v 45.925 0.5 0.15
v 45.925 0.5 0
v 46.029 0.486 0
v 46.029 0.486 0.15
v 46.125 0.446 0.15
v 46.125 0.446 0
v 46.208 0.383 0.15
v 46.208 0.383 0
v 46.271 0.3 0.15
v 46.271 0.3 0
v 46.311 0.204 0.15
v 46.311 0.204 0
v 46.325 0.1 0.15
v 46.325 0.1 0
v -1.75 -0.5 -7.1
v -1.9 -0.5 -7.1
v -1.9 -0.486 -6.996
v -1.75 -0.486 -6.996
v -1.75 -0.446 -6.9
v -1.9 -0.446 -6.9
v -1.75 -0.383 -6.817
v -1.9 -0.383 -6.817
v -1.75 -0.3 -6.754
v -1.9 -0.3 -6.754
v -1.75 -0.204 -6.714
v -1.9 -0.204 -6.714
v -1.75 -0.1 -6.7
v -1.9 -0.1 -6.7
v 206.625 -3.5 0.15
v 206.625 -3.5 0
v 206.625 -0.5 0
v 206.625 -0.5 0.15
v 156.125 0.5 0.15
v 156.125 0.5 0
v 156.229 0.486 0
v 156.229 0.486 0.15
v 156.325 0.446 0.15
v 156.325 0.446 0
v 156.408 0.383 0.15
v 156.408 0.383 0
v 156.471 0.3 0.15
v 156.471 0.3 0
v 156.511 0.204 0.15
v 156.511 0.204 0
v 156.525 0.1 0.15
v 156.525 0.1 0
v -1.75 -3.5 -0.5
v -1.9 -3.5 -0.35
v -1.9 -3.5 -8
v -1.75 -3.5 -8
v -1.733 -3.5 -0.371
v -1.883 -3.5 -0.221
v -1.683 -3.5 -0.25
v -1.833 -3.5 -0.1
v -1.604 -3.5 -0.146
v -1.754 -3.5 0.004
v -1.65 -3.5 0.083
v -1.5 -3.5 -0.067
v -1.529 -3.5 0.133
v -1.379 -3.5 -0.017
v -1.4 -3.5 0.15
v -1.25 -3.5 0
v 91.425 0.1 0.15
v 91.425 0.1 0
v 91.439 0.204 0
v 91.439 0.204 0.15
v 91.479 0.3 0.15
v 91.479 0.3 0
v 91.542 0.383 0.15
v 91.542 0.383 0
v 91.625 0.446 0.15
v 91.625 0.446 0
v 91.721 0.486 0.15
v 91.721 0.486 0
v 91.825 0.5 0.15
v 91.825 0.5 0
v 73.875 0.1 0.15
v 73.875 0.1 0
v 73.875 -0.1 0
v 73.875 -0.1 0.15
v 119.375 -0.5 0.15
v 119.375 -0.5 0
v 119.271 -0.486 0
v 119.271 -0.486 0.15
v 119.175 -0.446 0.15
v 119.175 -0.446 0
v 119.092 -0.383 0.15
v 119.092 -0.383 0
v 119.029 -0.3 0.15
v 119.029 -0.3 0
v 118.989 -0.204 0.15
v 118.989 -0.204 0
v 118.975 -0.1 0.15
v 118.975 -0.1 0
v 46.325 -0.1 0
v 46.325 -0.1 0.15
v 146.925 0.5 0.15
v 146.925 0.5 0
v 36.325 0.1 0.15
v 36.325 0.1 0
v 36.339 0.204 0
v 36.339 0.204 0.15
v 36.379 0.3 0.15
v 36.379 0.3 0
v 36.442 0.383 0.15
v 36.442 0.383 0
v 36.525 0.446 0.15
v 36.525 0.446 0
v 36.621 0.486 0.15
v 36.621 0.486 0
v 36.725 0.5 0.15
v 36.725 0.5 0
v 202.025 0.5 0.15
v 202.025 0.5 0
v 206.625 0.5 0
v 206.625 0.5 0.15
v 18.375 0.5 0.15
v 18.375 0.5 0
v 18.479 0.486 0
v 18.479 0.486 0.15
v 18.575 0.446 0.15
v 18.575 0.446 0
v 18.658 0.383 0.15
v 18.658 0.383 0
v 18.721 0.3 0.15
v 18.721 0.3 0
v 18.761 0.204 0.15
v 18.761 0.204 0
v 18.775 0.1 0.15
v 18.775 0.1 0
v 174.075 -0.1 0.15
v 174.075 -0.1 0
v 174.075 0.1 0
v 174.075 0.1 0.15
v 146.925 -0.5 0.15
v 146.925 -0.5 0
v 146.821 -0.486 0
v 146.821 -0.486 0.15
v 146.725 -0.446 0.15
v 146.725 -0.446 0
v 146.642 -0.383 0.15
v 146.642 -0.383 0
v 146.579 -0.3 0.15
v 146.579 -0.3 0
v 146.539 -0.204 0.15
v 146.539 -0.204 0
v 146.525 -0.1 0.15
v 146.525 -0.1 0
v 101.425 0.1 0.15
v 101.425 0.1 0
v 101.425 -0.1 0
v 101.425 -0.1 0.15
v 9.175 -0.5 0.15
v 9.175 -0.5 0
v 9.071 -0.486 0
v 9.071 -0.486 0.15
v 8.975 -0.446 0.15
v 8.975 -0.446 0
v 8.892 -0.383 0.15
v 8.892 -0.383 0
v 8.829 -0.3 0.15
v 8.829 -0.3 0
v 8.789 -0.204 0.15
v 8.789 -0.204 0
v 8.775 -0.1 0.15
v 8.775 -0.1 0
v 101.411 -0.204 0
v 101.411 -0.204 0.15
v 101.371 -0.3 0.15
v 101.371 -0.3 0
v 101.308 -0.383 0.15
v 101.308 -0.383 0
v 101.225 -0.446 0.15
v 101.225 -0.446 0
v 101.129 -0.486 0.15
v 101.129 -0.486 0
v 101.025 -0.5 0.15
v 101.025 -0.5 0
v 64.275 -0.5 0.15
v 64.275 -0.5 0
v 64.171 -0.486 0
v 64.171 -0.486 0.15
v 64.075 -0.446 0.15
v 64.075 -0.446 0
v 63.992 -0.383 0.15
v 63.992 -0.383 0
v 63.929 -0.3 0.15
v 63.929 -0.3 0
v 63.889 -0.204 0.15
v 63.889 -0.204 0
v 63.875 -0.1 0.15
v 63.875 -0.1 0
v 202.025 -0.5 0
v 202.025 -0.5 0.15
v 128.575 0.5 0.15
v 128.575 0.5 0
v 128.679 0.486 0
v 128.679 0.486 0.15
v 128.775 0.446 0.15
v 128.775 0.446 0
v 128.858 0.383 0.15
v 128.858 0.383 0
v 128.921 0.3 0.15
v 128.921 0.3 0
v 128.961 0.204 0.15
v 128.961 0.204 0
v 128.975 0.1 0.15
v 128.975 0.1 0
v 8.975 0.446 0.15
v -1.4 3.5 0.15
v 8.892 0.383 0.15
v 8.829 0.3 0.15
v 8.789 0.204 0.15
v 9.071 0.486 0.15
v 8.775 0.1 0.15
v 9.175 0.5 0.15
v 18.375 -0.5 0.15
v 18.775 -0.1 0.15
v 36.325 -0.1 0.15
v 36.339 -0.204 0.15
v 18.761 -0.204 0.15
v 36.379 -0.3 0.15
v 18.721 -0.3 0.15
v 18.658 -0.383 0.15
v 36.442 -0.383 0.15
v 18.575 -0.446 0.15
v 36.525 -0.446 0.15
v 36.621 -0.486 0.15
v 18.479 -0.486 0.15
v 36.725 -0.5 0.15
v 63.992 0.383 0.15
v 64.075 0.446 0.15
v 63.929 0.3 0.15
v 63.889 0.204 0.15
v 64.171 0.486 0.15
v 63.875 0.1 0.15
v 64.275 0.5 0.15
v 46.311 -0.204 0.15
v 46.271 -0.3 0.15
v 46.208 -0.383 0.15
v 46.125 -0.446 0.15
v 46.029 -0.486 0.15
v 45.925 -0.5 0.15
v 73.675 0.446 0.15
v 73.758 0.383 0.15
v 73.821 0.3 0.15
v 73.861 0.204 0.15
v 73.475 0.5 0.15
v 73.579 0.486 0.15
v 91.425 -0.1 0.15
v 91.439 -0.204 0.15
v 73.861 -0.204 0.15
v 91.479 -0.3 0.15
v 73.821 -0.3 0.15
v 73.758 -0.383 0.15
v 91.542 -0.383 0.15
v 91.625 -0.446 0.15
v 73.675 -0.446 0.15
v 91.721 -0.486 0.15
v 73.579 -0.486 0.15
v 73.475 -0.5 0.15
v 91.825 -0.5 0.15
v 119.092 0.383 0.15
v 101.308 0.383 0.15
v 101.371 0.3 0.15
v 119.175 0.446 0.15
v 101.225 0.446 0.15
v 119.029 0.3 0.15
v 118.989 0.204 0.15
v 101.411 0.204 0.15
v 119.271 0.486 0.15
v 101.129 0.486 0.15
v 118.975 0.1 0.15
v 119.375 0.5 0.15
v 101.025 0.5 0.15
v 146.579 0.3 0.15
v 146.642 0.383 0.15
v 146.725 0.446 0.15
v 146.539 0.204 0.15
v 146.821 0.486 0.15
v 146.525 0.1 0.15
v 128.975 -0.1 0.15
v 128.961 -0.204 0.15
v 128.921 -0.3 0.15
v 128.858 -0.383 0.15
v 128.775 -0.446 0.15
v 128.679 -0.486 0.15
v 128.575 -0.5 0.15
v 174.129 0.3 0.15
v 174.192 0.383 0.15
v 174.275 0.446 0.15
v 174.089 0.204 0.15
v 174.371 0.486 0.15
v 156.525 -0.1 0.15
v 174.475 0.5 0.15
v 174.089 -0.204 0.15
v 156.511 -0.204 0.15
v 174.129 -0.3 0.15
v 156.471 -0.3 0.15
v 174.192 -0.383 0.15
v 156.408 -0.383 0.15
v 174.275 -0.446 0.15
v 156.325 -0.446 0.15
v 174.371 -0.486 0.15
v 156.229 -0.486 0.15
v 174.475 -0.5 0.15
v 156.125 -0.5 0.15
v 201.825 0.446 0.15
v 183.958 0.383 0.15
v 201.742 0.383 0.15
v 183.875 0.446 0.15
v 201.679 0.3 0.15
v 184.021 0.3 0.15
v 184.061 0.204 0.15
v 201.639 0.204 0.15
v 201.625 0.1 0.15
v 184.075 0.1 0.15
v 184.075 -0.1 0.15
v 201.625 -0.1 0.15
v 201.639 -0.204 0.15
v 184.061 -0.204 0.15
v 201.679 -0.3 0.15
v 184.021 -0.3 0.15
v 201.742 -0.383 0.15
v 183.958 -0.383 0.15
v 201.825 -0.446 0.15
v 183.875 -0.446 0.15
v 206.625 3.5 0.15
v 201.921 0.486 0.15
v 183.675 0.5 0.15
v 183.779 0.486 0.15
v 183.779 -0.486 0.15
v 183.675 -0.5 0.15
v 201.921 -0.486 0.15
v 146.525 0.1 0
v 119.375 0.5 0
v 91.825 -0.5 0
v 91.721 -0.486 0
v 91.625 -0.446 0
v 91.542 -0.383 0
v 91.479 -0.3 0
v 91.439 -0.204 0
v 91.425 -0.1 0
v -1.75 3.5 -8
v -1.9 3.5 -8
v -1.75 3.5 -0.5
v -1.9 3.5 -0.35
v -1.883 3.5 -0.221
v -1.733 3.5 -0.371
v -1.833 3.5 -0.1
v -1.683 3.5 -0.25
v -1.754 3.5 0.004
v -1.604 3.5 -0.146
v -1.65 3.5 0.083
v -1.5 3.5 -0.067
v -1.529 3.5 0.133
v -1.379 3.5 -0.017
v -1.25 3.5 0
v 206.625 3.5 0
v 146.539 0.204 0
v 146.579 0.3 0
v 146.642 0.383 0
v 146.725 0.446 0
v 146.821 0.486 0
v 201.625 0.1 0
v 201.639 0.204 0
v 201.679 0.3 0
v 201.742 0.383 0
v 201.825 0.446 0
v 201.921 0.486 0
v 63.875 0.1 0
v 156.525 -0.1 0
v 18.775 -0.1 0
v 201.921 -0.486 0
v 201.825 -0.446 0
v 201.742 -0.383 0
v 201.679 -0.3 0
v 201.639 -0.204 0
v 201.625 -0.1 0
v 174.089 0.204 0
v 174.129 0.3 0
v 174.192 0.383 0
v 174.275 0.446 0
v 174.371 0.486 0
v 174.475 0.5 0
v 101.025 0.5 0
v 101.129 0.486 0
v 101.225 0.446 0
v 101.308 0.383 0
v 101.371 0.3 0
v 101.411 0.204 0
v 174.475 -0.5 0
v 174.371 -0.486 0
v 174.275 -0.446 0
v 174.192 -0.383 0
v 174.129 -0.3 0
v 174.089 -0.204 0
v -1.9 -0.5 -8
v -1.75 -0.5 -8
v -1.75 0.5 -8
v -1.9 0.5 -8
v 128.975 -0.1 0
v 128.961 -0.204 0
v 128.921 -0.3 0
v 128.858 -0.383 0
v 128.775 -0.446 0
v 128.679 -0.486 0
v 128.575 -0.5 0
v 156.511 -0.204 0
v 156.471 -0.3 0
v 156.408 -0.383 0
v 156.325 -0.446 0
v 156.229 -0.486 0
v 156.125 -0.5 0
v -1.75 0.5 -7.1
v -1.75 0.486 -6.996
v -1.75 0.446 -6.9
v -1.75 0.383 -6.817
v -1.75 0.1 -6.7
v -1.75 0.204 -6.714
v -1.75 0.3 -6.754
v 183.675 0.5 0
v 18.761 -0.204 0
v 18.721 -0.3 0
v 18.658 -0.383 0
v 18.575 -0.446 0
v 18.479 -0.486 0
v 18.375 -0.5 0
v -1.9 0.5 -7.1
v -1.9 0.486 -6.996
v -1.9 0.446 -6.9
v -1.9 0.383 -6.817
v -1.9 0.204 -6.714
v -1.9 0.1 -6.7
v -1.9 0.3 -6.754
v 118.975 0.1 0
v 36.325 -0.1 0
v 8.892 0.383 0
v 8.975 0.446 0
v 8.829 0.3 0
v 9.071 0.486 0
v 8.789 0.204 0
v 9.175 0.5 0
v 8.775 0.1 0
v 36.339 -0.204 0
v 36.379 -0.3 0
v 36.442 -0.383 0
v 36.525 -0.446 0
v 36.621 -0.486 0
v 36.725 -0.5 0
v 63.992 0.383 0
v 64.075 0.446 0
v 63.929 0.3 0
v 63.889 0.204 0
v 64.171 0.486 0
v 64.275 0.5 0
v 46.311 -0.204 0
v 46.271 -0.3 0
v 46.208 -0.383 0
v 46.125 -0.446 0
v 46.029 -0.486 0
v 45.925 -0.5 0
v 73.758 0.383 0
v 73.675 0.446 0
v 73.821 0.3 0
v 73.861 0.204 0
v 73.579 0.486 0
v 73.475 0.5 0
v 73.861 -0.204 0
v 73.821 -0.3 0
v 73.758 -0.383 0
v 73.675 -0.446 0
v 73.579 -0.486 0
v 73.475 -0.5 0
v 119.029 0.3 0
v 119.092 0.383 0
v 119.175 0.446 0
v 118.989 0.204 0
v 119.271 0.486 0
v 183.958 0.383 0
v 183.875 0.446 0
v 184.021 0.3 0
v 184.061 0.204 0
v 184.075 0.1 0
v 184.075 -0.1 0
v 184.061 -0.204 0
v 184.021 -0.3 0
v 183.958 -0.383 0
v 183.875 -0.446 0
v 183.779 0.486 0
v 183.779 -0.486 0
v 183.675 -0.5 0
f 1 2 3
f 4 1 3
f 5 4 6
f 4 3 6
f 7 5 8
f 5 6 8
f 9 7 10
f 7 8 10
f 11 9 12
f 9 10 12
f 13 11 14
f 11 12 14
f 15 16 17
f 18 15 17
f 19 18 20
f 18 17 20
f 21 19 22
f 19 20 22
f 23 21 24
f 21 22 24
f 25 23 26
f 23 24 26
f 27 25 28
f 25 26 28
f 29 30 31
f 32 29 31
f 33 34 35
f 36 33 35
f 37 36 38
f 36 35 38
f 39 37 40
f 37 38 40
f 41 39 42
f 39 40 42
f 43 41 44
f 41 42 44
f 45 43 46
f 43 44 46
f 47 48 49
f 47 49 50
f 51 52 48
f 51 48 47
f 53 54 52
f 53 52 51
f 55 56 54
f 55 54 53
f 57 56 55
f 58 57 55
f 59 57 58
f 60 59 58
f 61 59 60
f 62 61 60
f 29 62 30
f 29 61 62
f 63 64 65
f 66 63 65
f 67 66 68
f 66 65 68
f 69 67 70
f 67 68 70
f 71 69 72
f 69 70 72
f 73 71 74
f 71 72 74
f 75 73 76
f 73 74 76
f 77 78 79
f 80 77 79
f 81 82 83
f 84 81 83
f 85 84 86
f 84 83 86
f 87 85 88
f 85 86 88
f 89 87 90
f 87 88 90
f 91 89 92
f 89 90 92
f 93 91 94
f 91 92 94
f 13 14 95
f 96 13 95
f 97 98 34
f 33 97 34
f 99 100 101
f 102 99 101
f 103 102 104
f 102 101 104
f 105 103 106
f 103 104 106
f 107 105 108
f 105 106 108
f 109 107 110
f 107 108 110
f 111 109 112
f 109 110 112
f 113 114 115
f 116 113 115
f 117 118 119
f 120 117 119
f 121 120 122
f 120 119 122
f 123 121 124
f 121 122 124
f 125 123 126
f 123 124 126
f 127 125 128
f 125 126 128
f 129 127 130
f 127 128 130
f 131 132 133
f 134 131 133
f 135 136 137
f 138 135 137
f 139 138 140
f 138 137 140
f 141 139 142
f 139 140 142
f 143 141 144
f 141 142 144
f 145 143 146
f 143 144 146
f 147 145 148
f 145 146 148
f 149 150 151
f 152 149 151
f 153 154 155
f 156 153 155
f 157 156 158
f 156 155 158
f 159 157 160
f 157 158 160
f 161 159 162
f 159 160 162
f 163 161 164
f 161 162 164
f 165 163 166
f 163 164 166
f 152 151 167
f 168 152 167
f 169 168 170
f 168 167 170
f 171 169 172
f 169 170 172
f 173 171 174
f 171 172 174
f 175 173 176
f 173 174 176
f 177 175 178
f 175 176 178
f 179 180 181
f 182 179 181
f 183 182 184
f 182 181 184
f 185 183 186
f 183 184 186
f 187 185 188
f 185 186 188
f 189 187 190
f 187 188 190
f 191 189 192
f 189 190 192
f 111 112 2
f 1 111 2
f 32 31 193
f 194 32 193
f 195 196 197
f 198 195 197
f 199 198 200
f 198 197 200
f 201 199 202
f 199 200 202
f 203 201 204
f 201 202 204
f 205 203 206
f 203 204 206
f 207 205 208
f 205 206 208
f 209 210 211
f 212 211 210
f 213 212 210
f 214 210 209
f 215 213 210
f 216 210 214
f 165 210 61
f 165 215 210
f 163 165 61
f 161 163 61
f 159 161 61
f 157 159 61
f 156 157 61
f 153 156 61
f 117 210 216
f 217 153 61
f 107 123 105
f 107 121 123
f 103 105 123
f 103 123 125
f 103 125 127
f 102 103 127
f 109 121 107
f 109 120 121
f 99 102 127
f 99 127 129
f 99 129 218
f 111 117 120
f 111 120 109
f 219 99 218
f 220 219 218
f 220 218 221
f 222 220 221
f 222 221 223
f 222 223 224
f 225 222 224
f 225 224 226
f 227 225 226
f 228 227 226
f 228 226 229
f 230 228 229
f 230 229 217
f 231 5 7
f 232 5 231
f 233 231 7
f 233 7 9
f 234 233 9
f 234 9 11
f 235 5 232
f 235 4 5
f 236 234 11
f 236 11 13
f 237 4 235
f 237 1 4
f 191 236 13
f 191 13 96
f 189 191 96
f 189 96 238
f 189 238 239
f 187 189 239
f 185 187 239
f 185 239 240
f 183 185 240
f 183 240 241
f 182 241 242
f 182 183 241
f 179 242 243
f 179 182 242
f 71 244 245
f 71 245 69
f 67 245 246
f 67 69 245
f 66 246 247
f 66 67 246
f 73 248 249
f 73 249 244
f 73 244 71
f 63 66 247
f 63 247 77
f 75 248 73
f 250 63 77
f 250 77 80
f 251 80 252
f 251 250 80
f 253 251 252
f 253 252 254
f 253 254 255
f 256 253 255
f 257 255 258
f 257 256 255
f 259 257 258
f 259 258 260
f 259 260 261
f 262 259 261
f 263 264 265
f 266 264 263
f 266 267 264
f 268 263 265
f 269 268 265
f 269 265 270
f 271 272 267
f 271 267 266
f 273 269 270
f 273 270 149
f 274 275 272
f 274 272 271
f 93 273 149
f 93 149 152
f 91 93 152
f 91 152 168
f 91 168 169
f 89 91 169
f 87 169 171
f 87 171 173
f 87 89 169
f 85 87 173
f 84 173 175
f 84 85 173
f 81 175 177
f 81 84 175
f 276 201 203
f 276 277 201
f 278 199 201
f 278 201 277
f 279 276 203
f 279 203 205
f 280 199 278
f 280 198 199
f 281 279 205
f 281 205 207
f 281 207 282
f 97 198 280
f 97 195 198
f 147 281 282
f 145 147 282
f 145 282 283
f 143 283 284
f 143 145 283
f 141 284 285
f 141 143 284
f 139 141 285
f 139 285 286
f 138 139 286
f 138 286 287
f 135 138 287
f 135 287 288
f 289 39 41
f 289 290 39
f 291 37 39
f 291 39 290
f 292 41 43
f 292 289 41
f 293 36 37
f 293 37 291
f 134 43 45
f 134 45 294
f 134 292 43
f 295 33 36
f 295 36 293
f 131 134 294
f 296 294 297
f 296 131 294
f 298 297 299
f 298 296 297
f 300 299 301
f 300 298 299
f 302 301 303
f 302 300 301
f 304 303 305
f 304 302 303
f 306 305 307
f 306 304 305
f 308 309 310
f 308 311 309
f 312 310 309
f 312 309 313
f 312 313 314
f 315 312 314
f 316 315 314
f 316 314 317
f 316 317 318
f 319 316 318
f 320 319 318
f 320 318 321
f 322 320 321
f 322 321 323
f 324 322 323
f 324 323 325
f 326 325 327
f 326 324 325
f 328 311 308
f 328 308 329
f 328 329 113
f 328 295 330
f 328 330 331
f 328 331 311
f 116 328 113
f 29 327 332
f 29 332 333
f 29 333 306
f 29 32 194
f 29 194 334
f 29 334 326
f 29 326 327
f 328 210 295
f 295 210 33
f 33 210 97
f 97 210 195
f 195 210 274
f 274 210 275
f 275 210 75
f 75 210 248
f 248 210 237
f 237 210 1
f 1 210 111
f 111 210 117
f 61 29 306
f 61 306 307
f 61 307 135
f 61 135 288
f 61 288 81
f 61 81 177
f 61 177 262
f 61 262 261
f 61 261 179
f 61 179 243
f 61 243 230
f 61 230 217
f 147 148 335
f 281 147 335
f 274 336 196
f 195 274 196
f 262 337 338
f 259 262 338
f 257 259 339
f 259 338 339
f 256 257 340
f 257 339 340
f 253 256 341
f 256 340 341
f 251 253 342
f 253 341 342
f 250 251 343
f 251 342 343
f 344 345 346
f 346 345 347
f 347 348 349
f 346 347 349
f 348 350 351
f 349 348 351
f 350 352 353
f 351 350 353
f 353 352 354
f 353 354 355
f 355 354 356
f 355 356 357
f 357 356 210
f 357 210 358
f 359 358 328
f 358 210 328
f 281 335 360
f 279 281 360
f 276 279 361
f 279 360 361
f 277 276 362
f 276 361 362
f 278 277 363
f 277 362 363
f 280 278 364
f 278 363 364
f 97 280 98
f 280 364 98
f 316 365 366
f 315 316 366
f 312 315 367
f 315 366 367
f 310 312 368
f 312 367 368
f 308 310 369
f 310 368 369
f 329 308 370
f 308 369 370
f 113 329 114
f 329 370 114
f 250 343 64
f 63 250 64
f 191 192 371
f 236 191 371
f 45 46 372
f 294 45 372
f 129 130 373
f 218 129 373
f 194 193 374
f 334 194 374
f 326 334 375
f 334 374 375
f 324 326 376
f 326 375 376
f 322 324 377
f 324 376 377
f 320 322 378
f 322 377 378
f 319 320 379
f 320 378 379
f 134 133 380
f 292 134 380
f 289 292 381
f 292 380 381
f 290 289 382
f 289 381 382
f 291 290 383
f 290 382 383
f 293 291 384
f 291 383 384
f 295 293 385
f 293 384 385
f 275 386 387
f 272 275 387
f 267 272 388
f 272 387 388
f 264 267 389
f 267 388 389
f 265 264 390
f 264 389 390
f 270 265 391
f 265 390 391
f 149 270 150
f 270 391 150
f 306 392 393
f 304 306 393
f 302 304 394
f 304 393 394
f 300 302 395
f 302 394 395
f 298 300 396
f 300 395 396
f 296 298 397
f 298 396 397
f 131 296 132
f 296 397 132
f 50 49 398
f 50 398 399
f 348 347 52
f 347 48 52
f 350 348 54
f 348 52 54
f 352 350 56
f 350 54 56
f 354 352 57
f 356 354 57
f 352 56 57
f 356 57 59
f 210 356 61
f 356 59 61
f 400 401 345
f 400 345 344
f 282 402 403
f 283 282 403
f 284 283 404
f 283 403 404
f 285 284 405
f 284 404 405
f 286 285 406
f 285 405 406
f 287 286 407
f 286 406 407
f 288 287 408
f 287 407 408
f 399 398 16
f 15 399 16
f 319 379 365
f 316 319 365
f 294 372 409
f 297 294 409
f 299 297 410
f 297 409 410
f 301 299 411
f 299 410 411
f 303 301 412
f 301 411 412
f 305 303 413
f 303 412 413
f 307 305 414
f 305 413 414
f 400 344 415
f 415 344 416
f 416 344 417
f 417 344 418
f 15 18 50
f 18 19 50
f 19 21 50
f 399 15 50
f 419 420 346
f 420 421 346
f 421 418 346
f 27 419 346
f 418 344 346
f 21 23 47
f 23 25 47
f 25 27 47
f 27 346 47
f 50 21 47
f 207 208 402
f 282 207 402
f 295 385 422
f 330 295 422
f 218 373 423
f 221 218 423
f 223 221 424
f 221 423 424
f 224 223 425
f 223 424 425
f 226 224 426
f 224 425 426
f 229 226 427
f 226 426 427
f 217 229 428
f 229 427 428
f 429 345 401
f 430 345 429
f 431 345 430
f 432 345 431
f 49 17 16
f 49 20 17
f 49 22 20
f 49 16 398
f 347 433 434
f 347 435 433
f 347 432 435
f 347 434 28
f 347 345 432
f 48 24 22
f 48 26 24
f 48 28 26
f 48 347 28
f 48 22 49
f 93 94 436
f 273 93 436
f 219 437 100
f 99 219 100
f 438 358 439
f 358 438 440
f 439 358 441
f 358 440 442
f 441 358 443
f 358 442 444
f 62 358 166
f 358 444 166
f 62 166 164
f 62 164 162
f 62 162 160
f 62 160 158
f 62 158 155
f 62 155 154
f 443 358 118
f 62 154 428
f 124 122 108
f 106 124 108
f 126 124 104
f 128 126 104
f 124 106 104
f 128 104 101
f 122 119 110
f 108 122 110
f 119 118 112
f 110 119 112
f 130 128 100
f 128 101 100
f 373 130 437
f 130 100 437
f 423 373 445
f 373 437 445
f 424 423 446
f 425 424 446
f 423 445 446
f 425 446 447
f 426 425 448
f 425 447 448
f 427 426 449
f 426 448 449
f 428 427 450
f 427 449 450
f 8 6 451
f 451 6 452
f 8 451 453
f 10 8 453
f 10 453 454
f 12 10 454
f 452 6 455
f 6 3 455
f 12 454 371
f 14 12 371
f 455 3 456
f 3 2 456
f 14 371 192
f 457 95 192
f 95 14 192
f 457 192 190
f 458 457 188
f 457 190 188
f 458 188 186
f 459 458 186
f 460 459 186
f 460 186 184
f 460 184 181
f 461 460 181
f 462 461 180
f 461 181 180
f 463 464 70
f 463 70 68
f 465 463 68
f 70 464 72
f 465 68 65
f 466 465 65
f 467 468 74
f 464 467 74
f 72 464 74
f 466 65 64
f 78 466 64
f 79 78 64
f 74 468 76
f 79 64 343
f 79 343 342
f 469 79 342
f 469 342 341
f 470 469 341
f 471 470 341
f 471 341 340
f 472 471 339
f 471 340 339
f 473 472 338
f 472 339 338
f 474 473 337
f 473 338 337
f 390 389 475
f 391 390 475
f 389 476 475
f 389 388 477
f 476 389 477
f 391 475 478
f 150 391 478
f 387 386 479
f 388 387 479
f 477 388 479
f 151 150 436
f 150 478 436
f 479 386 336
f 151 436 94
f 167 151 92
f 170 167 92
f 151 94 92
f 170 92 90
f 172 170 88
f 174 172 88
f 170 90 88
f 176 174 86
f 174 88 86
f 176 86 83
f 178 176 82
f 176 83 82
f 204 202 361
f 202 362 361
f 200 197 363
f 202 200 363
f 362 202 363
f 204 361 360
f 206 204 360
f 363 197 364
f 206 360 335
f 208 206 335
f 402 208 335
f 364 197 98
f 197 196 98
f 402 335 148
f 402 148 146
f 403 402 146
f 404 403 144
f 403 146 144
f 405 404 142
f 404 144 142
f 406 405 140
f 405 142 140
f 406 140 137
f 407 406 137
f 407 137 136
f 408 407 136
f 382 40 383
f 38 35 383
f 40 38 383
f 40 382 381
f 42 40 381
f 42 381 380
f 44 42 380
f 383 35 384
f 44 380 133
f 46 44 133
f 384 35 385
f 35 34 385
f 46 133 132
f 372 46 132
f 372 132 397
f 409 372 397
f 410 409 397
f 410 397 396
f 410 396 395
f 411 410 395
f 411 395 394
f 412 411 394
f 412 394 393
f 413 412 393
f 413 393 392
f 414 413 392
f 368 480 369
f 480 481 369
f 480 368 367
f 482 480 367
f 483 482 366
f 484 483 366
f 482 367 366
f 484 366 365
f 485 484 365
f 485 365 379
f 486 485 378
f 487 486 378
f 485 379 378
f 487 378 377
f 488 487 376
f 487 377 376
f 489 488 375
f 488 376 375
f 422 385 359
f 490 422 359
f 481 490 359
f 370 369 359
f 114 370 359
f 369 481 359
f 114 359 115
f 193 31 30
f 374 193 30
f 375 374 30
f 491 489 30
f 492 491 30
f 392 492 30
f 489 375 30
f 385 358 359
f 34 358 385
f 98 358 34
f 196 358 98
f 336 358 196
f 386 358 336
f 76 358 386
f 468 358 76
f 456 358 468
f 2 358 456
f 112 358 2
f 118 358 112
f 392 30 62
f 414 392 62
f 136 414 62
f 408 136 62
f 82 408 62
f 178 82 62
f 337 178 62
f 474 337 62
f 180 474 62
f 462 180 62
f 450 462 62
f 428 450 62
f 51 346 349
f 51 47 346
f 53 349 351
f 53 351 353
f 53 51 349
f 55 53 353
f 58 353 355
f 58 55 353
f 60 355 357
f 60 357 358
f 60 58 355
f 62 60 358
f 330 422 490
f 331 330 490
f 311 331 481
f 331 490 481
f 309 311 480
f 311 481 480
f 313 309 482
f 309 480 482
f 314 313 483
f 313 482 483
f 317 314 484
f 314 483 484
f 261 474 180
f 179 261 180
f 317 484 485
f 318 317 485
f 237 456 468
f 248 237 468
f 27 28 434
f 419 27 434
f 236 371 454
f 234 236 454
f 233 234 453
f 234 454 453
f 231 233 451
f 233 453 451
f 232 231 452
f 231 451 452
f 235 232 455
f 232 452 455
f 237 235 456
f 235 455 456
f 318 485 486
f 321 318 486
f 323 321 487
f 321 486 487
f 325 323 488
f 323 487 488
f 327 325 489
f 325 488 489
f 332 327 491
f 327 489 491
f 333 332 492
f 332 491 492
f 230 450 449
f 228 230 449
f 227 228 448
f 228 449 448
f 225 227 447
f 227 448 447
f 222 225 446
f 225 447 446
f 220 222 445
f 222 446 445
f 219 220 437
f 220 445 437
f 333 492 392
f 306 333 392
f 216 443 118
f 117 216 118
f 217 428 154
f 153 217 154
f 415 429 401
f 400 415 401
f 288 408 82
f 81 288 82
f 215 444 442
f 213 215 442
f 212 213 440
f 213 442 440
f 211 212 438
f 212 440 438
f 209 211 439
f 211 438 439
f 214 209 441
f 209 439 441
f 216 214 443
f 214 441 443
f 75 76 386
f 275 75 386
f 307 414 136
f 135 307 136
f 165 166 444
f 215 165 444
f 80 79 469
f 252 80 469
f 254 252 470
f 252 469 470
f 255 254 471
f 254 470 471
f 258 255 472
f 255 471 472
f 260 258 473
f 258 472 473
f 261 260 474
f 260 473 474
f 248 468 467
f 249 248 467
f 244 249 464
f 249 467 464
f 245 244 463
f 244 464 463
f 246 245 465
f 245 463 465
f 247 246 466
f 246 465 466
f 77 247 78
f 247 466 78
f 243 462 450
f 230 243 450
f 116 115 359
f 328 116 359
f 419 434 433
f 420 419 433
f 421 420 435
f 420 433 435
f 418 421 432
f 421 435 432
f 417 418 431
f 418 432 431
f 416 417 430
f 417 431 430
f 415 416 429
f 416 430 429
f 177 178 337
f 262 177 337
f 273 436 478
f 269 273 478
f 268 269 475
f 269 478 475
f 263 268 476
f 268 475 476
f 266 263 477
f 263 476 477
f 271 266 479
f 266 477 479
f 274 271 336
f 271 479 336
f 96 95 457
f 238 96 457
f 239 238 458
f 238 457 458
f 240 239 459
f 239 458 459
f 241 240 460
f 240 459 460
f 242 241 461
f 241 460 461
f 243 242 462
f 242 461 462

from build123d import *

# Parameters (mm, degrees)
F1_DEPTH = 0.15
F2_DEPTH = 1.9
F3_W     = 0.15
F3_H     = 7
F4_DEPTH = 8
F6_DEPTH = 25
F7_R     = 0.5


with BuildPart() as f1:
    # F0 (on Top) → F1 (new body)
    with BuildSketch(Plane.XY):
        with BuildLine():
            Line((96.425, -0.5), (96.425, -3.5))
            Line((96.425, -3.5), (99.425, -3.5))
            Line((99.425, -3.5), (110.2, -3.5))
            Line((110.2, -3.5), (123.975, -3.5))
            Line((123.975, -3.5), (123.975, -0.5))
            Line((123.975, -0.5), (119.375, -0.5))
            ThreePointArc((119.375, -0.5), (119.0921572875, -0.3828427125), (118.975, -0.1))
            Line((118.975, -0.1), (118.975, 0.1))
            ThreePointArc((118.975, 0.1), (119.0921572875, 0.3828427125), (119.375, 0.5))
            Line((119.375, 0.5), (123.975, 0.5))
            Line((123.975, 0.5), (123.975, 3.5))
            Line((123.975, 3.5), (110.2, 3.5))
            Line((110.2, 3.5), (99.425, 3.5))
            Line((99.425, 3.5), (96.425, 3.5))
            Line((96.425, 3.5), (96.425, 0.5))
            Line((96.425, 0.5), (101.025, 0.5))
            ThreePointArc((101.025, 0.5), (101.3078427125, 0.3828427125), (101.425, 0.1))
            Line((101.425, 0.1), (101.425, -0.1))
            ThreePointArc((101.425, -0.1), (101.3078427125, -0.3828427125), (101.025, -0.5))
            Line((101.025, -0.5), (96.425, -0.5))
        make_face()
        with BuildLine():
            Line((13.775, -0.5), (13.775, -3.5))
            Line((13.775, -3.5), (27.55, -3.5))
            Line((27.55, -3.5), (41.325, -3.5))
            Line((41.325, -3.5), (41.325, -0.5))
            Line((41.325, -0.5), (36.725, -0.5))
            ThreePointArc((36.725, -0.5), (36.4421572875, -0.3828427125), (36.325, -0.1))
            Line((36.325, -0.1), (36.325, 0.1))
            ThreePointArc((36.325, 0.1), (36.4421572875, 0.3828427125), (36.725, 0.5))
            Line((36.725, 0.5), (41.325, 0.5))
            Line((41.325, 0.5), (41.325, 3.5))
            Line((41.325, 3.5), (27.55, 3.5))
            Line((27.55, 3.5), (13.775, 3.5))
            Line((13.775, 3.5), (13.775, 0.5))
            Line((13.775, 0.5), (18.375, 0.5))
            ThreePointArc((18.375, 0.5), (18.6578427125, 0.3828427125), (18.775, 0.1))
            Line((18.775, 0.1), (18.775, -0.1))
            ThreePointArc((18.775, -0.1), (18.6578427125, -0.3828427125), (18.375, -0.5))
            Line((18.375, -0.5), (13.775, -0.5))
        make_face()
        with BuildLine():
            Line((41.325, -0.5), (41.325, -3.5))
            Line((41.325, -3.5), (55.1, -3.5))
            Line((55.1, -3.5), (68.875, -3.5))
            Line((68.875, -3.5), (68.875, -0.5))
            Line((68.875, -0.5), (64.275, -0.5))
            ThreePointArc((64.275, -0.5), (63.9921572875, -0.3828427125), (63.875, -0.1))
            Line((63.875, -0.1), (63.875, 0.1))
            ThreePointArc((63.875, 0.1), (63.9921572875, 0.3828427125), (64.275, 0.5))
            Line((64.275, 0.5), (68.875, 0.5))
            Line((68.875, 0.5), (68.875, 3.5))
            Line((68.875, 3.5), (55.1, 3.5))
            Line((55.1, 3.5), (41.325, 3.5))
            Line((41.325, 3.5), (41.325, 0.5))
            Line((41.325, 0.5), (45.925, 0.5))
            ThreePointArc((45.925, 0.5), (46.2078427125, 0.3828427125), (46.325, 0.1))
            Line((46.325, 0.1), (46.325, -0.1))
            ThreePointArc((46.325, -0.1), (46.2078427125, -0.3828427125), (45.925, -0.5))
            Line((45.925, -0.5), (41.325, -0.5))
        make_face()
        with BuildLine():
            Line((68.875, -0.5), (68.875, -3.5))
            Line((68.875, -3.5), (82.65, -3.5))
            Line((82.65, -3.5), (96.425, -3.5))
            Line((96.425, -3.5), (96.425, -0.5))
            Line((96.425, -0.5), (91.825, -0.5))
            ThreePointArc((91.825, -0.5), (91.5421572875, -0.3828427125), (91.425, -0.1))
            Line((91.425, -0.1), (91.425, 0.1))
            ThreePointArc((91.425, 0.1), (91.5421572875, 0.3828427125), (91.825, 0.5))
            Line((91.825, 0.5), (96.425, 0.5))
            Line((96.425, 0.5), (96.425, 3.5))
            Line((96.425, 3.5), (82.65, 3.5))
            Line((82.65, 3.5), (68.875, 3.5))
            Line((68.875, 3.5), (68.875, 0.5))
            Line((68.875, 0.5), (73.475, 0.5))
            ThreePointArc((73.475, 0.5), (73.7578427125, 0.3828427125), (73.875, 0.1))
            Line((73.875, 0.1), (73.875, -0.1))
            ThreePointArc((73.875, -0.1), (73.7578427125, -0.3828427125), (73.475, -0.5))
            Line((73.475, -0.5), (68.875, -0.5))
        make_face()
        with BuildLine():
            Line((0, 3.5), (0, -3.5))
            Line((0, -3.5), (13.775, -3.5))
            Line((13.775, -3.5), (13.775, -0.5))
            Line((13.775, -0.5), (9.175, -0.5))
            ThreePointArc((9.175, -0.5), (8.8921572875, -0.3828427125), (8.775, -0.1))
            Line((8.775, -0.1), (8.775, 0.1))
            ThreePointArc((8.775, 0.1), (8.8921572875, 0.3828427125), (9.175, 0.5))
            Line((9.175, 0.5), (13.775, 0.5))
            Line((13.775, 0.5), (13.775, 3.5))
            Line((13.775, 3.5), (0, 3.5))
        make_face()
        with BuildLine():
            Line((123.975, -0.5), (123.975, -3.5))
            Line((123.975, -3.5), (137.75, -3.5))
            Line((137.75, -3.5), (151.525, -3.5))
            Line((151.525, -3.5), (151.525, -0.5))
            Line((151.525, -0.5), (146.925, -0.5))
            ThreePointArc((146.925, -0.5), (146.6421572875, -0.3828427125), (146.525, -0.1))
            Line((146.525, -0.1), (146.525, 0.1))
            ThreePointArc((146.525, 0.1), (146.6421572875, 0.3828427125), (146.925, 0.5))
            Line((146.925, 0.5), (151.525, 0.5))
            Line((151.525, 0.5), (151.525, 3.5))
            Line((151.525, 3.5), (137.75, 3.5))
            Line((137.75, 3.5), (123.975, 3.5))
            Line((123.975, 3.5), (123.975, 0.5))
            Line((123.975, 0.5), (128.575, 0.5))
            ThreePointArc((128.575, 0.5), (128.8578427125, 0.3828427125), (128.975, 0.1))
            Line((128.975, 0.1), (128.975, -0.1))
            ThreePointArc((128.975, -0.1), (128.8578427125, -0.3828427125), (128.575, -0.5))
            Line((128.575, -0.5), (123.975, -0.5))
        make_face()
        with BuildLine():
            Line((151.525, -0.5), (151.525, -3.5))
            Line((151.525, -3.5), (165.3, -3.5))
            Line((165.3, -3.5), (179.075, -3.5))
            Line((179.075, -3.5), (179.075, -0.5))
            Line((179.075, -0.5), (174.475, -0.5))
            ThreePointArc((174.475, -0.5), (174.1921572875, -0.3828427125), (174.075, -0.1))
            Line((174.075, -0.1), (174.075, 0.1))
            ThreePointArc((174.075, 0.1), (174.1921572875, 0.3828427125), (174.475, 0.5))
            Line((174.475, 0.5), (179.075, 0.5))
            Line((179.075, 0.5), (179.075, 3.5))
            Line((179.075, 3.5), (165.3, 3.5))
            Line((165.3, 3.5), (151.525, 3.5))
            Line((151.525, 3.5), (151.525, 0.5))
            Line((151.525, 0.5), (156.125, 0.5))
            ThreePointArc((156.125, 0.5), (156.4078427125, 0.3828427125), (156.525, 0.1))
            Line((156.525, 0.1), (156.525, -0.1))
            ThreePointArc((156.525, -0.1), (156.4078427125, -0.3828427125), (156.125, -0.5))
            Line((156.125, -0.5), (151.525, -0.5))
        make_face()
        with BuildLine():
            Line((179.075, -0.5), (179.075, -3.5))
            Line((179.075, -3.5), (192.85, -3.5))
            Line((192.85, -3.5), (206.625, -3.5))
            Line((206.625, -3.5), (206.625, -0.5))
            Line((206.625, -0.5), (202.025, -0.5))
            ThreePointArc((202.025, -0.5), (201.7421572875, -0.3828427125), (201.625, -0.1))
            Line((201.625, -0.1), (201.625, 0.1))
            ThreePointArc((201.625, 0.1), (201.7421572875, 0.3828427125), (202.025, 0.5))
            Line((202.025, 0.5), (206.625, 0.5))
            Line((206.625, 0.5), (206.625, 3.5))
            Line((206.625, 3.5), (192.85, 3.5))
            Line((192.85, 3.5), (179.075, 3.5))
            Line((179.075, 3.5), (179.075, 0.5))
            Line((179.075, 0.5), (183.675, 0.5))
            ThreePointArc((183.675, 0.5), (183.9578427125, 0.3828427125), (184.075, 0.1))
            Line((184.075, 0.1), (184.075, -0.1))
            ThreePointArc((184.075, -0.1), (183.9578427125, -0.3828427125), (183.675, -0.5))
            Line((183.675, -0.5), (179.075, -0.5))
        make_face()
    extrude(amount=F1_DEPTH)

    # F2 (add): a face of the model
    f2_faces = [f1.faces().sort_by_distance(p)[0] for p in [
        (0, 0, 0.075),
    ]]
    extrude(f2_faces, amount=F2_DEPTH)

    # F3 (on face) → F4 (join)
    with BuildSketch(Plane(origin=(0, 0, 0), x_dir=(1, 0, 0), z_dir=(0, 0, -1))):
        with Locations((-1.825, 0)):
            Rectangle(F3_W, F3_H)
    extrude(amount=F4_DEPTH)

    # F5 (on face) → F6 (cut)
    with BuildSketch(Plane(origin=(-1.9, 0, 0), x_dir=(0, -1, 0), z_dir=(-1, 0, 0))):
        with BuildLine():
            ThreePointArc((0.5, -7.1), (0.3828427125, -6.8171572875), (0.1, -6.7))
            Line((0.1, -6.7), (-0.1, -6.7))
            ThreePointArc((-0.1, -6.7), (-0.3828427125, -6.8171572875), (-0.5, -7.1))
            Line((-0.5, -7.1), (-0.5, -8))
            Line((-0.5, -8), (0.5, -8))
            Line((0.5, -8), (0.5, -7.1))
        make_face()
    extrude(amount=-F6_DEPTH, mode=Mode.SUBTRACT)

    # F7
    f7_edges = [f1.edges().sort_by_distance(p)[0] for p in [
        (-1.9, 0, 0.15),
        (-1.75, 0, 0),
    ]]
    fillet(f7_edges, radius=F7_R)


solid = f1.part
